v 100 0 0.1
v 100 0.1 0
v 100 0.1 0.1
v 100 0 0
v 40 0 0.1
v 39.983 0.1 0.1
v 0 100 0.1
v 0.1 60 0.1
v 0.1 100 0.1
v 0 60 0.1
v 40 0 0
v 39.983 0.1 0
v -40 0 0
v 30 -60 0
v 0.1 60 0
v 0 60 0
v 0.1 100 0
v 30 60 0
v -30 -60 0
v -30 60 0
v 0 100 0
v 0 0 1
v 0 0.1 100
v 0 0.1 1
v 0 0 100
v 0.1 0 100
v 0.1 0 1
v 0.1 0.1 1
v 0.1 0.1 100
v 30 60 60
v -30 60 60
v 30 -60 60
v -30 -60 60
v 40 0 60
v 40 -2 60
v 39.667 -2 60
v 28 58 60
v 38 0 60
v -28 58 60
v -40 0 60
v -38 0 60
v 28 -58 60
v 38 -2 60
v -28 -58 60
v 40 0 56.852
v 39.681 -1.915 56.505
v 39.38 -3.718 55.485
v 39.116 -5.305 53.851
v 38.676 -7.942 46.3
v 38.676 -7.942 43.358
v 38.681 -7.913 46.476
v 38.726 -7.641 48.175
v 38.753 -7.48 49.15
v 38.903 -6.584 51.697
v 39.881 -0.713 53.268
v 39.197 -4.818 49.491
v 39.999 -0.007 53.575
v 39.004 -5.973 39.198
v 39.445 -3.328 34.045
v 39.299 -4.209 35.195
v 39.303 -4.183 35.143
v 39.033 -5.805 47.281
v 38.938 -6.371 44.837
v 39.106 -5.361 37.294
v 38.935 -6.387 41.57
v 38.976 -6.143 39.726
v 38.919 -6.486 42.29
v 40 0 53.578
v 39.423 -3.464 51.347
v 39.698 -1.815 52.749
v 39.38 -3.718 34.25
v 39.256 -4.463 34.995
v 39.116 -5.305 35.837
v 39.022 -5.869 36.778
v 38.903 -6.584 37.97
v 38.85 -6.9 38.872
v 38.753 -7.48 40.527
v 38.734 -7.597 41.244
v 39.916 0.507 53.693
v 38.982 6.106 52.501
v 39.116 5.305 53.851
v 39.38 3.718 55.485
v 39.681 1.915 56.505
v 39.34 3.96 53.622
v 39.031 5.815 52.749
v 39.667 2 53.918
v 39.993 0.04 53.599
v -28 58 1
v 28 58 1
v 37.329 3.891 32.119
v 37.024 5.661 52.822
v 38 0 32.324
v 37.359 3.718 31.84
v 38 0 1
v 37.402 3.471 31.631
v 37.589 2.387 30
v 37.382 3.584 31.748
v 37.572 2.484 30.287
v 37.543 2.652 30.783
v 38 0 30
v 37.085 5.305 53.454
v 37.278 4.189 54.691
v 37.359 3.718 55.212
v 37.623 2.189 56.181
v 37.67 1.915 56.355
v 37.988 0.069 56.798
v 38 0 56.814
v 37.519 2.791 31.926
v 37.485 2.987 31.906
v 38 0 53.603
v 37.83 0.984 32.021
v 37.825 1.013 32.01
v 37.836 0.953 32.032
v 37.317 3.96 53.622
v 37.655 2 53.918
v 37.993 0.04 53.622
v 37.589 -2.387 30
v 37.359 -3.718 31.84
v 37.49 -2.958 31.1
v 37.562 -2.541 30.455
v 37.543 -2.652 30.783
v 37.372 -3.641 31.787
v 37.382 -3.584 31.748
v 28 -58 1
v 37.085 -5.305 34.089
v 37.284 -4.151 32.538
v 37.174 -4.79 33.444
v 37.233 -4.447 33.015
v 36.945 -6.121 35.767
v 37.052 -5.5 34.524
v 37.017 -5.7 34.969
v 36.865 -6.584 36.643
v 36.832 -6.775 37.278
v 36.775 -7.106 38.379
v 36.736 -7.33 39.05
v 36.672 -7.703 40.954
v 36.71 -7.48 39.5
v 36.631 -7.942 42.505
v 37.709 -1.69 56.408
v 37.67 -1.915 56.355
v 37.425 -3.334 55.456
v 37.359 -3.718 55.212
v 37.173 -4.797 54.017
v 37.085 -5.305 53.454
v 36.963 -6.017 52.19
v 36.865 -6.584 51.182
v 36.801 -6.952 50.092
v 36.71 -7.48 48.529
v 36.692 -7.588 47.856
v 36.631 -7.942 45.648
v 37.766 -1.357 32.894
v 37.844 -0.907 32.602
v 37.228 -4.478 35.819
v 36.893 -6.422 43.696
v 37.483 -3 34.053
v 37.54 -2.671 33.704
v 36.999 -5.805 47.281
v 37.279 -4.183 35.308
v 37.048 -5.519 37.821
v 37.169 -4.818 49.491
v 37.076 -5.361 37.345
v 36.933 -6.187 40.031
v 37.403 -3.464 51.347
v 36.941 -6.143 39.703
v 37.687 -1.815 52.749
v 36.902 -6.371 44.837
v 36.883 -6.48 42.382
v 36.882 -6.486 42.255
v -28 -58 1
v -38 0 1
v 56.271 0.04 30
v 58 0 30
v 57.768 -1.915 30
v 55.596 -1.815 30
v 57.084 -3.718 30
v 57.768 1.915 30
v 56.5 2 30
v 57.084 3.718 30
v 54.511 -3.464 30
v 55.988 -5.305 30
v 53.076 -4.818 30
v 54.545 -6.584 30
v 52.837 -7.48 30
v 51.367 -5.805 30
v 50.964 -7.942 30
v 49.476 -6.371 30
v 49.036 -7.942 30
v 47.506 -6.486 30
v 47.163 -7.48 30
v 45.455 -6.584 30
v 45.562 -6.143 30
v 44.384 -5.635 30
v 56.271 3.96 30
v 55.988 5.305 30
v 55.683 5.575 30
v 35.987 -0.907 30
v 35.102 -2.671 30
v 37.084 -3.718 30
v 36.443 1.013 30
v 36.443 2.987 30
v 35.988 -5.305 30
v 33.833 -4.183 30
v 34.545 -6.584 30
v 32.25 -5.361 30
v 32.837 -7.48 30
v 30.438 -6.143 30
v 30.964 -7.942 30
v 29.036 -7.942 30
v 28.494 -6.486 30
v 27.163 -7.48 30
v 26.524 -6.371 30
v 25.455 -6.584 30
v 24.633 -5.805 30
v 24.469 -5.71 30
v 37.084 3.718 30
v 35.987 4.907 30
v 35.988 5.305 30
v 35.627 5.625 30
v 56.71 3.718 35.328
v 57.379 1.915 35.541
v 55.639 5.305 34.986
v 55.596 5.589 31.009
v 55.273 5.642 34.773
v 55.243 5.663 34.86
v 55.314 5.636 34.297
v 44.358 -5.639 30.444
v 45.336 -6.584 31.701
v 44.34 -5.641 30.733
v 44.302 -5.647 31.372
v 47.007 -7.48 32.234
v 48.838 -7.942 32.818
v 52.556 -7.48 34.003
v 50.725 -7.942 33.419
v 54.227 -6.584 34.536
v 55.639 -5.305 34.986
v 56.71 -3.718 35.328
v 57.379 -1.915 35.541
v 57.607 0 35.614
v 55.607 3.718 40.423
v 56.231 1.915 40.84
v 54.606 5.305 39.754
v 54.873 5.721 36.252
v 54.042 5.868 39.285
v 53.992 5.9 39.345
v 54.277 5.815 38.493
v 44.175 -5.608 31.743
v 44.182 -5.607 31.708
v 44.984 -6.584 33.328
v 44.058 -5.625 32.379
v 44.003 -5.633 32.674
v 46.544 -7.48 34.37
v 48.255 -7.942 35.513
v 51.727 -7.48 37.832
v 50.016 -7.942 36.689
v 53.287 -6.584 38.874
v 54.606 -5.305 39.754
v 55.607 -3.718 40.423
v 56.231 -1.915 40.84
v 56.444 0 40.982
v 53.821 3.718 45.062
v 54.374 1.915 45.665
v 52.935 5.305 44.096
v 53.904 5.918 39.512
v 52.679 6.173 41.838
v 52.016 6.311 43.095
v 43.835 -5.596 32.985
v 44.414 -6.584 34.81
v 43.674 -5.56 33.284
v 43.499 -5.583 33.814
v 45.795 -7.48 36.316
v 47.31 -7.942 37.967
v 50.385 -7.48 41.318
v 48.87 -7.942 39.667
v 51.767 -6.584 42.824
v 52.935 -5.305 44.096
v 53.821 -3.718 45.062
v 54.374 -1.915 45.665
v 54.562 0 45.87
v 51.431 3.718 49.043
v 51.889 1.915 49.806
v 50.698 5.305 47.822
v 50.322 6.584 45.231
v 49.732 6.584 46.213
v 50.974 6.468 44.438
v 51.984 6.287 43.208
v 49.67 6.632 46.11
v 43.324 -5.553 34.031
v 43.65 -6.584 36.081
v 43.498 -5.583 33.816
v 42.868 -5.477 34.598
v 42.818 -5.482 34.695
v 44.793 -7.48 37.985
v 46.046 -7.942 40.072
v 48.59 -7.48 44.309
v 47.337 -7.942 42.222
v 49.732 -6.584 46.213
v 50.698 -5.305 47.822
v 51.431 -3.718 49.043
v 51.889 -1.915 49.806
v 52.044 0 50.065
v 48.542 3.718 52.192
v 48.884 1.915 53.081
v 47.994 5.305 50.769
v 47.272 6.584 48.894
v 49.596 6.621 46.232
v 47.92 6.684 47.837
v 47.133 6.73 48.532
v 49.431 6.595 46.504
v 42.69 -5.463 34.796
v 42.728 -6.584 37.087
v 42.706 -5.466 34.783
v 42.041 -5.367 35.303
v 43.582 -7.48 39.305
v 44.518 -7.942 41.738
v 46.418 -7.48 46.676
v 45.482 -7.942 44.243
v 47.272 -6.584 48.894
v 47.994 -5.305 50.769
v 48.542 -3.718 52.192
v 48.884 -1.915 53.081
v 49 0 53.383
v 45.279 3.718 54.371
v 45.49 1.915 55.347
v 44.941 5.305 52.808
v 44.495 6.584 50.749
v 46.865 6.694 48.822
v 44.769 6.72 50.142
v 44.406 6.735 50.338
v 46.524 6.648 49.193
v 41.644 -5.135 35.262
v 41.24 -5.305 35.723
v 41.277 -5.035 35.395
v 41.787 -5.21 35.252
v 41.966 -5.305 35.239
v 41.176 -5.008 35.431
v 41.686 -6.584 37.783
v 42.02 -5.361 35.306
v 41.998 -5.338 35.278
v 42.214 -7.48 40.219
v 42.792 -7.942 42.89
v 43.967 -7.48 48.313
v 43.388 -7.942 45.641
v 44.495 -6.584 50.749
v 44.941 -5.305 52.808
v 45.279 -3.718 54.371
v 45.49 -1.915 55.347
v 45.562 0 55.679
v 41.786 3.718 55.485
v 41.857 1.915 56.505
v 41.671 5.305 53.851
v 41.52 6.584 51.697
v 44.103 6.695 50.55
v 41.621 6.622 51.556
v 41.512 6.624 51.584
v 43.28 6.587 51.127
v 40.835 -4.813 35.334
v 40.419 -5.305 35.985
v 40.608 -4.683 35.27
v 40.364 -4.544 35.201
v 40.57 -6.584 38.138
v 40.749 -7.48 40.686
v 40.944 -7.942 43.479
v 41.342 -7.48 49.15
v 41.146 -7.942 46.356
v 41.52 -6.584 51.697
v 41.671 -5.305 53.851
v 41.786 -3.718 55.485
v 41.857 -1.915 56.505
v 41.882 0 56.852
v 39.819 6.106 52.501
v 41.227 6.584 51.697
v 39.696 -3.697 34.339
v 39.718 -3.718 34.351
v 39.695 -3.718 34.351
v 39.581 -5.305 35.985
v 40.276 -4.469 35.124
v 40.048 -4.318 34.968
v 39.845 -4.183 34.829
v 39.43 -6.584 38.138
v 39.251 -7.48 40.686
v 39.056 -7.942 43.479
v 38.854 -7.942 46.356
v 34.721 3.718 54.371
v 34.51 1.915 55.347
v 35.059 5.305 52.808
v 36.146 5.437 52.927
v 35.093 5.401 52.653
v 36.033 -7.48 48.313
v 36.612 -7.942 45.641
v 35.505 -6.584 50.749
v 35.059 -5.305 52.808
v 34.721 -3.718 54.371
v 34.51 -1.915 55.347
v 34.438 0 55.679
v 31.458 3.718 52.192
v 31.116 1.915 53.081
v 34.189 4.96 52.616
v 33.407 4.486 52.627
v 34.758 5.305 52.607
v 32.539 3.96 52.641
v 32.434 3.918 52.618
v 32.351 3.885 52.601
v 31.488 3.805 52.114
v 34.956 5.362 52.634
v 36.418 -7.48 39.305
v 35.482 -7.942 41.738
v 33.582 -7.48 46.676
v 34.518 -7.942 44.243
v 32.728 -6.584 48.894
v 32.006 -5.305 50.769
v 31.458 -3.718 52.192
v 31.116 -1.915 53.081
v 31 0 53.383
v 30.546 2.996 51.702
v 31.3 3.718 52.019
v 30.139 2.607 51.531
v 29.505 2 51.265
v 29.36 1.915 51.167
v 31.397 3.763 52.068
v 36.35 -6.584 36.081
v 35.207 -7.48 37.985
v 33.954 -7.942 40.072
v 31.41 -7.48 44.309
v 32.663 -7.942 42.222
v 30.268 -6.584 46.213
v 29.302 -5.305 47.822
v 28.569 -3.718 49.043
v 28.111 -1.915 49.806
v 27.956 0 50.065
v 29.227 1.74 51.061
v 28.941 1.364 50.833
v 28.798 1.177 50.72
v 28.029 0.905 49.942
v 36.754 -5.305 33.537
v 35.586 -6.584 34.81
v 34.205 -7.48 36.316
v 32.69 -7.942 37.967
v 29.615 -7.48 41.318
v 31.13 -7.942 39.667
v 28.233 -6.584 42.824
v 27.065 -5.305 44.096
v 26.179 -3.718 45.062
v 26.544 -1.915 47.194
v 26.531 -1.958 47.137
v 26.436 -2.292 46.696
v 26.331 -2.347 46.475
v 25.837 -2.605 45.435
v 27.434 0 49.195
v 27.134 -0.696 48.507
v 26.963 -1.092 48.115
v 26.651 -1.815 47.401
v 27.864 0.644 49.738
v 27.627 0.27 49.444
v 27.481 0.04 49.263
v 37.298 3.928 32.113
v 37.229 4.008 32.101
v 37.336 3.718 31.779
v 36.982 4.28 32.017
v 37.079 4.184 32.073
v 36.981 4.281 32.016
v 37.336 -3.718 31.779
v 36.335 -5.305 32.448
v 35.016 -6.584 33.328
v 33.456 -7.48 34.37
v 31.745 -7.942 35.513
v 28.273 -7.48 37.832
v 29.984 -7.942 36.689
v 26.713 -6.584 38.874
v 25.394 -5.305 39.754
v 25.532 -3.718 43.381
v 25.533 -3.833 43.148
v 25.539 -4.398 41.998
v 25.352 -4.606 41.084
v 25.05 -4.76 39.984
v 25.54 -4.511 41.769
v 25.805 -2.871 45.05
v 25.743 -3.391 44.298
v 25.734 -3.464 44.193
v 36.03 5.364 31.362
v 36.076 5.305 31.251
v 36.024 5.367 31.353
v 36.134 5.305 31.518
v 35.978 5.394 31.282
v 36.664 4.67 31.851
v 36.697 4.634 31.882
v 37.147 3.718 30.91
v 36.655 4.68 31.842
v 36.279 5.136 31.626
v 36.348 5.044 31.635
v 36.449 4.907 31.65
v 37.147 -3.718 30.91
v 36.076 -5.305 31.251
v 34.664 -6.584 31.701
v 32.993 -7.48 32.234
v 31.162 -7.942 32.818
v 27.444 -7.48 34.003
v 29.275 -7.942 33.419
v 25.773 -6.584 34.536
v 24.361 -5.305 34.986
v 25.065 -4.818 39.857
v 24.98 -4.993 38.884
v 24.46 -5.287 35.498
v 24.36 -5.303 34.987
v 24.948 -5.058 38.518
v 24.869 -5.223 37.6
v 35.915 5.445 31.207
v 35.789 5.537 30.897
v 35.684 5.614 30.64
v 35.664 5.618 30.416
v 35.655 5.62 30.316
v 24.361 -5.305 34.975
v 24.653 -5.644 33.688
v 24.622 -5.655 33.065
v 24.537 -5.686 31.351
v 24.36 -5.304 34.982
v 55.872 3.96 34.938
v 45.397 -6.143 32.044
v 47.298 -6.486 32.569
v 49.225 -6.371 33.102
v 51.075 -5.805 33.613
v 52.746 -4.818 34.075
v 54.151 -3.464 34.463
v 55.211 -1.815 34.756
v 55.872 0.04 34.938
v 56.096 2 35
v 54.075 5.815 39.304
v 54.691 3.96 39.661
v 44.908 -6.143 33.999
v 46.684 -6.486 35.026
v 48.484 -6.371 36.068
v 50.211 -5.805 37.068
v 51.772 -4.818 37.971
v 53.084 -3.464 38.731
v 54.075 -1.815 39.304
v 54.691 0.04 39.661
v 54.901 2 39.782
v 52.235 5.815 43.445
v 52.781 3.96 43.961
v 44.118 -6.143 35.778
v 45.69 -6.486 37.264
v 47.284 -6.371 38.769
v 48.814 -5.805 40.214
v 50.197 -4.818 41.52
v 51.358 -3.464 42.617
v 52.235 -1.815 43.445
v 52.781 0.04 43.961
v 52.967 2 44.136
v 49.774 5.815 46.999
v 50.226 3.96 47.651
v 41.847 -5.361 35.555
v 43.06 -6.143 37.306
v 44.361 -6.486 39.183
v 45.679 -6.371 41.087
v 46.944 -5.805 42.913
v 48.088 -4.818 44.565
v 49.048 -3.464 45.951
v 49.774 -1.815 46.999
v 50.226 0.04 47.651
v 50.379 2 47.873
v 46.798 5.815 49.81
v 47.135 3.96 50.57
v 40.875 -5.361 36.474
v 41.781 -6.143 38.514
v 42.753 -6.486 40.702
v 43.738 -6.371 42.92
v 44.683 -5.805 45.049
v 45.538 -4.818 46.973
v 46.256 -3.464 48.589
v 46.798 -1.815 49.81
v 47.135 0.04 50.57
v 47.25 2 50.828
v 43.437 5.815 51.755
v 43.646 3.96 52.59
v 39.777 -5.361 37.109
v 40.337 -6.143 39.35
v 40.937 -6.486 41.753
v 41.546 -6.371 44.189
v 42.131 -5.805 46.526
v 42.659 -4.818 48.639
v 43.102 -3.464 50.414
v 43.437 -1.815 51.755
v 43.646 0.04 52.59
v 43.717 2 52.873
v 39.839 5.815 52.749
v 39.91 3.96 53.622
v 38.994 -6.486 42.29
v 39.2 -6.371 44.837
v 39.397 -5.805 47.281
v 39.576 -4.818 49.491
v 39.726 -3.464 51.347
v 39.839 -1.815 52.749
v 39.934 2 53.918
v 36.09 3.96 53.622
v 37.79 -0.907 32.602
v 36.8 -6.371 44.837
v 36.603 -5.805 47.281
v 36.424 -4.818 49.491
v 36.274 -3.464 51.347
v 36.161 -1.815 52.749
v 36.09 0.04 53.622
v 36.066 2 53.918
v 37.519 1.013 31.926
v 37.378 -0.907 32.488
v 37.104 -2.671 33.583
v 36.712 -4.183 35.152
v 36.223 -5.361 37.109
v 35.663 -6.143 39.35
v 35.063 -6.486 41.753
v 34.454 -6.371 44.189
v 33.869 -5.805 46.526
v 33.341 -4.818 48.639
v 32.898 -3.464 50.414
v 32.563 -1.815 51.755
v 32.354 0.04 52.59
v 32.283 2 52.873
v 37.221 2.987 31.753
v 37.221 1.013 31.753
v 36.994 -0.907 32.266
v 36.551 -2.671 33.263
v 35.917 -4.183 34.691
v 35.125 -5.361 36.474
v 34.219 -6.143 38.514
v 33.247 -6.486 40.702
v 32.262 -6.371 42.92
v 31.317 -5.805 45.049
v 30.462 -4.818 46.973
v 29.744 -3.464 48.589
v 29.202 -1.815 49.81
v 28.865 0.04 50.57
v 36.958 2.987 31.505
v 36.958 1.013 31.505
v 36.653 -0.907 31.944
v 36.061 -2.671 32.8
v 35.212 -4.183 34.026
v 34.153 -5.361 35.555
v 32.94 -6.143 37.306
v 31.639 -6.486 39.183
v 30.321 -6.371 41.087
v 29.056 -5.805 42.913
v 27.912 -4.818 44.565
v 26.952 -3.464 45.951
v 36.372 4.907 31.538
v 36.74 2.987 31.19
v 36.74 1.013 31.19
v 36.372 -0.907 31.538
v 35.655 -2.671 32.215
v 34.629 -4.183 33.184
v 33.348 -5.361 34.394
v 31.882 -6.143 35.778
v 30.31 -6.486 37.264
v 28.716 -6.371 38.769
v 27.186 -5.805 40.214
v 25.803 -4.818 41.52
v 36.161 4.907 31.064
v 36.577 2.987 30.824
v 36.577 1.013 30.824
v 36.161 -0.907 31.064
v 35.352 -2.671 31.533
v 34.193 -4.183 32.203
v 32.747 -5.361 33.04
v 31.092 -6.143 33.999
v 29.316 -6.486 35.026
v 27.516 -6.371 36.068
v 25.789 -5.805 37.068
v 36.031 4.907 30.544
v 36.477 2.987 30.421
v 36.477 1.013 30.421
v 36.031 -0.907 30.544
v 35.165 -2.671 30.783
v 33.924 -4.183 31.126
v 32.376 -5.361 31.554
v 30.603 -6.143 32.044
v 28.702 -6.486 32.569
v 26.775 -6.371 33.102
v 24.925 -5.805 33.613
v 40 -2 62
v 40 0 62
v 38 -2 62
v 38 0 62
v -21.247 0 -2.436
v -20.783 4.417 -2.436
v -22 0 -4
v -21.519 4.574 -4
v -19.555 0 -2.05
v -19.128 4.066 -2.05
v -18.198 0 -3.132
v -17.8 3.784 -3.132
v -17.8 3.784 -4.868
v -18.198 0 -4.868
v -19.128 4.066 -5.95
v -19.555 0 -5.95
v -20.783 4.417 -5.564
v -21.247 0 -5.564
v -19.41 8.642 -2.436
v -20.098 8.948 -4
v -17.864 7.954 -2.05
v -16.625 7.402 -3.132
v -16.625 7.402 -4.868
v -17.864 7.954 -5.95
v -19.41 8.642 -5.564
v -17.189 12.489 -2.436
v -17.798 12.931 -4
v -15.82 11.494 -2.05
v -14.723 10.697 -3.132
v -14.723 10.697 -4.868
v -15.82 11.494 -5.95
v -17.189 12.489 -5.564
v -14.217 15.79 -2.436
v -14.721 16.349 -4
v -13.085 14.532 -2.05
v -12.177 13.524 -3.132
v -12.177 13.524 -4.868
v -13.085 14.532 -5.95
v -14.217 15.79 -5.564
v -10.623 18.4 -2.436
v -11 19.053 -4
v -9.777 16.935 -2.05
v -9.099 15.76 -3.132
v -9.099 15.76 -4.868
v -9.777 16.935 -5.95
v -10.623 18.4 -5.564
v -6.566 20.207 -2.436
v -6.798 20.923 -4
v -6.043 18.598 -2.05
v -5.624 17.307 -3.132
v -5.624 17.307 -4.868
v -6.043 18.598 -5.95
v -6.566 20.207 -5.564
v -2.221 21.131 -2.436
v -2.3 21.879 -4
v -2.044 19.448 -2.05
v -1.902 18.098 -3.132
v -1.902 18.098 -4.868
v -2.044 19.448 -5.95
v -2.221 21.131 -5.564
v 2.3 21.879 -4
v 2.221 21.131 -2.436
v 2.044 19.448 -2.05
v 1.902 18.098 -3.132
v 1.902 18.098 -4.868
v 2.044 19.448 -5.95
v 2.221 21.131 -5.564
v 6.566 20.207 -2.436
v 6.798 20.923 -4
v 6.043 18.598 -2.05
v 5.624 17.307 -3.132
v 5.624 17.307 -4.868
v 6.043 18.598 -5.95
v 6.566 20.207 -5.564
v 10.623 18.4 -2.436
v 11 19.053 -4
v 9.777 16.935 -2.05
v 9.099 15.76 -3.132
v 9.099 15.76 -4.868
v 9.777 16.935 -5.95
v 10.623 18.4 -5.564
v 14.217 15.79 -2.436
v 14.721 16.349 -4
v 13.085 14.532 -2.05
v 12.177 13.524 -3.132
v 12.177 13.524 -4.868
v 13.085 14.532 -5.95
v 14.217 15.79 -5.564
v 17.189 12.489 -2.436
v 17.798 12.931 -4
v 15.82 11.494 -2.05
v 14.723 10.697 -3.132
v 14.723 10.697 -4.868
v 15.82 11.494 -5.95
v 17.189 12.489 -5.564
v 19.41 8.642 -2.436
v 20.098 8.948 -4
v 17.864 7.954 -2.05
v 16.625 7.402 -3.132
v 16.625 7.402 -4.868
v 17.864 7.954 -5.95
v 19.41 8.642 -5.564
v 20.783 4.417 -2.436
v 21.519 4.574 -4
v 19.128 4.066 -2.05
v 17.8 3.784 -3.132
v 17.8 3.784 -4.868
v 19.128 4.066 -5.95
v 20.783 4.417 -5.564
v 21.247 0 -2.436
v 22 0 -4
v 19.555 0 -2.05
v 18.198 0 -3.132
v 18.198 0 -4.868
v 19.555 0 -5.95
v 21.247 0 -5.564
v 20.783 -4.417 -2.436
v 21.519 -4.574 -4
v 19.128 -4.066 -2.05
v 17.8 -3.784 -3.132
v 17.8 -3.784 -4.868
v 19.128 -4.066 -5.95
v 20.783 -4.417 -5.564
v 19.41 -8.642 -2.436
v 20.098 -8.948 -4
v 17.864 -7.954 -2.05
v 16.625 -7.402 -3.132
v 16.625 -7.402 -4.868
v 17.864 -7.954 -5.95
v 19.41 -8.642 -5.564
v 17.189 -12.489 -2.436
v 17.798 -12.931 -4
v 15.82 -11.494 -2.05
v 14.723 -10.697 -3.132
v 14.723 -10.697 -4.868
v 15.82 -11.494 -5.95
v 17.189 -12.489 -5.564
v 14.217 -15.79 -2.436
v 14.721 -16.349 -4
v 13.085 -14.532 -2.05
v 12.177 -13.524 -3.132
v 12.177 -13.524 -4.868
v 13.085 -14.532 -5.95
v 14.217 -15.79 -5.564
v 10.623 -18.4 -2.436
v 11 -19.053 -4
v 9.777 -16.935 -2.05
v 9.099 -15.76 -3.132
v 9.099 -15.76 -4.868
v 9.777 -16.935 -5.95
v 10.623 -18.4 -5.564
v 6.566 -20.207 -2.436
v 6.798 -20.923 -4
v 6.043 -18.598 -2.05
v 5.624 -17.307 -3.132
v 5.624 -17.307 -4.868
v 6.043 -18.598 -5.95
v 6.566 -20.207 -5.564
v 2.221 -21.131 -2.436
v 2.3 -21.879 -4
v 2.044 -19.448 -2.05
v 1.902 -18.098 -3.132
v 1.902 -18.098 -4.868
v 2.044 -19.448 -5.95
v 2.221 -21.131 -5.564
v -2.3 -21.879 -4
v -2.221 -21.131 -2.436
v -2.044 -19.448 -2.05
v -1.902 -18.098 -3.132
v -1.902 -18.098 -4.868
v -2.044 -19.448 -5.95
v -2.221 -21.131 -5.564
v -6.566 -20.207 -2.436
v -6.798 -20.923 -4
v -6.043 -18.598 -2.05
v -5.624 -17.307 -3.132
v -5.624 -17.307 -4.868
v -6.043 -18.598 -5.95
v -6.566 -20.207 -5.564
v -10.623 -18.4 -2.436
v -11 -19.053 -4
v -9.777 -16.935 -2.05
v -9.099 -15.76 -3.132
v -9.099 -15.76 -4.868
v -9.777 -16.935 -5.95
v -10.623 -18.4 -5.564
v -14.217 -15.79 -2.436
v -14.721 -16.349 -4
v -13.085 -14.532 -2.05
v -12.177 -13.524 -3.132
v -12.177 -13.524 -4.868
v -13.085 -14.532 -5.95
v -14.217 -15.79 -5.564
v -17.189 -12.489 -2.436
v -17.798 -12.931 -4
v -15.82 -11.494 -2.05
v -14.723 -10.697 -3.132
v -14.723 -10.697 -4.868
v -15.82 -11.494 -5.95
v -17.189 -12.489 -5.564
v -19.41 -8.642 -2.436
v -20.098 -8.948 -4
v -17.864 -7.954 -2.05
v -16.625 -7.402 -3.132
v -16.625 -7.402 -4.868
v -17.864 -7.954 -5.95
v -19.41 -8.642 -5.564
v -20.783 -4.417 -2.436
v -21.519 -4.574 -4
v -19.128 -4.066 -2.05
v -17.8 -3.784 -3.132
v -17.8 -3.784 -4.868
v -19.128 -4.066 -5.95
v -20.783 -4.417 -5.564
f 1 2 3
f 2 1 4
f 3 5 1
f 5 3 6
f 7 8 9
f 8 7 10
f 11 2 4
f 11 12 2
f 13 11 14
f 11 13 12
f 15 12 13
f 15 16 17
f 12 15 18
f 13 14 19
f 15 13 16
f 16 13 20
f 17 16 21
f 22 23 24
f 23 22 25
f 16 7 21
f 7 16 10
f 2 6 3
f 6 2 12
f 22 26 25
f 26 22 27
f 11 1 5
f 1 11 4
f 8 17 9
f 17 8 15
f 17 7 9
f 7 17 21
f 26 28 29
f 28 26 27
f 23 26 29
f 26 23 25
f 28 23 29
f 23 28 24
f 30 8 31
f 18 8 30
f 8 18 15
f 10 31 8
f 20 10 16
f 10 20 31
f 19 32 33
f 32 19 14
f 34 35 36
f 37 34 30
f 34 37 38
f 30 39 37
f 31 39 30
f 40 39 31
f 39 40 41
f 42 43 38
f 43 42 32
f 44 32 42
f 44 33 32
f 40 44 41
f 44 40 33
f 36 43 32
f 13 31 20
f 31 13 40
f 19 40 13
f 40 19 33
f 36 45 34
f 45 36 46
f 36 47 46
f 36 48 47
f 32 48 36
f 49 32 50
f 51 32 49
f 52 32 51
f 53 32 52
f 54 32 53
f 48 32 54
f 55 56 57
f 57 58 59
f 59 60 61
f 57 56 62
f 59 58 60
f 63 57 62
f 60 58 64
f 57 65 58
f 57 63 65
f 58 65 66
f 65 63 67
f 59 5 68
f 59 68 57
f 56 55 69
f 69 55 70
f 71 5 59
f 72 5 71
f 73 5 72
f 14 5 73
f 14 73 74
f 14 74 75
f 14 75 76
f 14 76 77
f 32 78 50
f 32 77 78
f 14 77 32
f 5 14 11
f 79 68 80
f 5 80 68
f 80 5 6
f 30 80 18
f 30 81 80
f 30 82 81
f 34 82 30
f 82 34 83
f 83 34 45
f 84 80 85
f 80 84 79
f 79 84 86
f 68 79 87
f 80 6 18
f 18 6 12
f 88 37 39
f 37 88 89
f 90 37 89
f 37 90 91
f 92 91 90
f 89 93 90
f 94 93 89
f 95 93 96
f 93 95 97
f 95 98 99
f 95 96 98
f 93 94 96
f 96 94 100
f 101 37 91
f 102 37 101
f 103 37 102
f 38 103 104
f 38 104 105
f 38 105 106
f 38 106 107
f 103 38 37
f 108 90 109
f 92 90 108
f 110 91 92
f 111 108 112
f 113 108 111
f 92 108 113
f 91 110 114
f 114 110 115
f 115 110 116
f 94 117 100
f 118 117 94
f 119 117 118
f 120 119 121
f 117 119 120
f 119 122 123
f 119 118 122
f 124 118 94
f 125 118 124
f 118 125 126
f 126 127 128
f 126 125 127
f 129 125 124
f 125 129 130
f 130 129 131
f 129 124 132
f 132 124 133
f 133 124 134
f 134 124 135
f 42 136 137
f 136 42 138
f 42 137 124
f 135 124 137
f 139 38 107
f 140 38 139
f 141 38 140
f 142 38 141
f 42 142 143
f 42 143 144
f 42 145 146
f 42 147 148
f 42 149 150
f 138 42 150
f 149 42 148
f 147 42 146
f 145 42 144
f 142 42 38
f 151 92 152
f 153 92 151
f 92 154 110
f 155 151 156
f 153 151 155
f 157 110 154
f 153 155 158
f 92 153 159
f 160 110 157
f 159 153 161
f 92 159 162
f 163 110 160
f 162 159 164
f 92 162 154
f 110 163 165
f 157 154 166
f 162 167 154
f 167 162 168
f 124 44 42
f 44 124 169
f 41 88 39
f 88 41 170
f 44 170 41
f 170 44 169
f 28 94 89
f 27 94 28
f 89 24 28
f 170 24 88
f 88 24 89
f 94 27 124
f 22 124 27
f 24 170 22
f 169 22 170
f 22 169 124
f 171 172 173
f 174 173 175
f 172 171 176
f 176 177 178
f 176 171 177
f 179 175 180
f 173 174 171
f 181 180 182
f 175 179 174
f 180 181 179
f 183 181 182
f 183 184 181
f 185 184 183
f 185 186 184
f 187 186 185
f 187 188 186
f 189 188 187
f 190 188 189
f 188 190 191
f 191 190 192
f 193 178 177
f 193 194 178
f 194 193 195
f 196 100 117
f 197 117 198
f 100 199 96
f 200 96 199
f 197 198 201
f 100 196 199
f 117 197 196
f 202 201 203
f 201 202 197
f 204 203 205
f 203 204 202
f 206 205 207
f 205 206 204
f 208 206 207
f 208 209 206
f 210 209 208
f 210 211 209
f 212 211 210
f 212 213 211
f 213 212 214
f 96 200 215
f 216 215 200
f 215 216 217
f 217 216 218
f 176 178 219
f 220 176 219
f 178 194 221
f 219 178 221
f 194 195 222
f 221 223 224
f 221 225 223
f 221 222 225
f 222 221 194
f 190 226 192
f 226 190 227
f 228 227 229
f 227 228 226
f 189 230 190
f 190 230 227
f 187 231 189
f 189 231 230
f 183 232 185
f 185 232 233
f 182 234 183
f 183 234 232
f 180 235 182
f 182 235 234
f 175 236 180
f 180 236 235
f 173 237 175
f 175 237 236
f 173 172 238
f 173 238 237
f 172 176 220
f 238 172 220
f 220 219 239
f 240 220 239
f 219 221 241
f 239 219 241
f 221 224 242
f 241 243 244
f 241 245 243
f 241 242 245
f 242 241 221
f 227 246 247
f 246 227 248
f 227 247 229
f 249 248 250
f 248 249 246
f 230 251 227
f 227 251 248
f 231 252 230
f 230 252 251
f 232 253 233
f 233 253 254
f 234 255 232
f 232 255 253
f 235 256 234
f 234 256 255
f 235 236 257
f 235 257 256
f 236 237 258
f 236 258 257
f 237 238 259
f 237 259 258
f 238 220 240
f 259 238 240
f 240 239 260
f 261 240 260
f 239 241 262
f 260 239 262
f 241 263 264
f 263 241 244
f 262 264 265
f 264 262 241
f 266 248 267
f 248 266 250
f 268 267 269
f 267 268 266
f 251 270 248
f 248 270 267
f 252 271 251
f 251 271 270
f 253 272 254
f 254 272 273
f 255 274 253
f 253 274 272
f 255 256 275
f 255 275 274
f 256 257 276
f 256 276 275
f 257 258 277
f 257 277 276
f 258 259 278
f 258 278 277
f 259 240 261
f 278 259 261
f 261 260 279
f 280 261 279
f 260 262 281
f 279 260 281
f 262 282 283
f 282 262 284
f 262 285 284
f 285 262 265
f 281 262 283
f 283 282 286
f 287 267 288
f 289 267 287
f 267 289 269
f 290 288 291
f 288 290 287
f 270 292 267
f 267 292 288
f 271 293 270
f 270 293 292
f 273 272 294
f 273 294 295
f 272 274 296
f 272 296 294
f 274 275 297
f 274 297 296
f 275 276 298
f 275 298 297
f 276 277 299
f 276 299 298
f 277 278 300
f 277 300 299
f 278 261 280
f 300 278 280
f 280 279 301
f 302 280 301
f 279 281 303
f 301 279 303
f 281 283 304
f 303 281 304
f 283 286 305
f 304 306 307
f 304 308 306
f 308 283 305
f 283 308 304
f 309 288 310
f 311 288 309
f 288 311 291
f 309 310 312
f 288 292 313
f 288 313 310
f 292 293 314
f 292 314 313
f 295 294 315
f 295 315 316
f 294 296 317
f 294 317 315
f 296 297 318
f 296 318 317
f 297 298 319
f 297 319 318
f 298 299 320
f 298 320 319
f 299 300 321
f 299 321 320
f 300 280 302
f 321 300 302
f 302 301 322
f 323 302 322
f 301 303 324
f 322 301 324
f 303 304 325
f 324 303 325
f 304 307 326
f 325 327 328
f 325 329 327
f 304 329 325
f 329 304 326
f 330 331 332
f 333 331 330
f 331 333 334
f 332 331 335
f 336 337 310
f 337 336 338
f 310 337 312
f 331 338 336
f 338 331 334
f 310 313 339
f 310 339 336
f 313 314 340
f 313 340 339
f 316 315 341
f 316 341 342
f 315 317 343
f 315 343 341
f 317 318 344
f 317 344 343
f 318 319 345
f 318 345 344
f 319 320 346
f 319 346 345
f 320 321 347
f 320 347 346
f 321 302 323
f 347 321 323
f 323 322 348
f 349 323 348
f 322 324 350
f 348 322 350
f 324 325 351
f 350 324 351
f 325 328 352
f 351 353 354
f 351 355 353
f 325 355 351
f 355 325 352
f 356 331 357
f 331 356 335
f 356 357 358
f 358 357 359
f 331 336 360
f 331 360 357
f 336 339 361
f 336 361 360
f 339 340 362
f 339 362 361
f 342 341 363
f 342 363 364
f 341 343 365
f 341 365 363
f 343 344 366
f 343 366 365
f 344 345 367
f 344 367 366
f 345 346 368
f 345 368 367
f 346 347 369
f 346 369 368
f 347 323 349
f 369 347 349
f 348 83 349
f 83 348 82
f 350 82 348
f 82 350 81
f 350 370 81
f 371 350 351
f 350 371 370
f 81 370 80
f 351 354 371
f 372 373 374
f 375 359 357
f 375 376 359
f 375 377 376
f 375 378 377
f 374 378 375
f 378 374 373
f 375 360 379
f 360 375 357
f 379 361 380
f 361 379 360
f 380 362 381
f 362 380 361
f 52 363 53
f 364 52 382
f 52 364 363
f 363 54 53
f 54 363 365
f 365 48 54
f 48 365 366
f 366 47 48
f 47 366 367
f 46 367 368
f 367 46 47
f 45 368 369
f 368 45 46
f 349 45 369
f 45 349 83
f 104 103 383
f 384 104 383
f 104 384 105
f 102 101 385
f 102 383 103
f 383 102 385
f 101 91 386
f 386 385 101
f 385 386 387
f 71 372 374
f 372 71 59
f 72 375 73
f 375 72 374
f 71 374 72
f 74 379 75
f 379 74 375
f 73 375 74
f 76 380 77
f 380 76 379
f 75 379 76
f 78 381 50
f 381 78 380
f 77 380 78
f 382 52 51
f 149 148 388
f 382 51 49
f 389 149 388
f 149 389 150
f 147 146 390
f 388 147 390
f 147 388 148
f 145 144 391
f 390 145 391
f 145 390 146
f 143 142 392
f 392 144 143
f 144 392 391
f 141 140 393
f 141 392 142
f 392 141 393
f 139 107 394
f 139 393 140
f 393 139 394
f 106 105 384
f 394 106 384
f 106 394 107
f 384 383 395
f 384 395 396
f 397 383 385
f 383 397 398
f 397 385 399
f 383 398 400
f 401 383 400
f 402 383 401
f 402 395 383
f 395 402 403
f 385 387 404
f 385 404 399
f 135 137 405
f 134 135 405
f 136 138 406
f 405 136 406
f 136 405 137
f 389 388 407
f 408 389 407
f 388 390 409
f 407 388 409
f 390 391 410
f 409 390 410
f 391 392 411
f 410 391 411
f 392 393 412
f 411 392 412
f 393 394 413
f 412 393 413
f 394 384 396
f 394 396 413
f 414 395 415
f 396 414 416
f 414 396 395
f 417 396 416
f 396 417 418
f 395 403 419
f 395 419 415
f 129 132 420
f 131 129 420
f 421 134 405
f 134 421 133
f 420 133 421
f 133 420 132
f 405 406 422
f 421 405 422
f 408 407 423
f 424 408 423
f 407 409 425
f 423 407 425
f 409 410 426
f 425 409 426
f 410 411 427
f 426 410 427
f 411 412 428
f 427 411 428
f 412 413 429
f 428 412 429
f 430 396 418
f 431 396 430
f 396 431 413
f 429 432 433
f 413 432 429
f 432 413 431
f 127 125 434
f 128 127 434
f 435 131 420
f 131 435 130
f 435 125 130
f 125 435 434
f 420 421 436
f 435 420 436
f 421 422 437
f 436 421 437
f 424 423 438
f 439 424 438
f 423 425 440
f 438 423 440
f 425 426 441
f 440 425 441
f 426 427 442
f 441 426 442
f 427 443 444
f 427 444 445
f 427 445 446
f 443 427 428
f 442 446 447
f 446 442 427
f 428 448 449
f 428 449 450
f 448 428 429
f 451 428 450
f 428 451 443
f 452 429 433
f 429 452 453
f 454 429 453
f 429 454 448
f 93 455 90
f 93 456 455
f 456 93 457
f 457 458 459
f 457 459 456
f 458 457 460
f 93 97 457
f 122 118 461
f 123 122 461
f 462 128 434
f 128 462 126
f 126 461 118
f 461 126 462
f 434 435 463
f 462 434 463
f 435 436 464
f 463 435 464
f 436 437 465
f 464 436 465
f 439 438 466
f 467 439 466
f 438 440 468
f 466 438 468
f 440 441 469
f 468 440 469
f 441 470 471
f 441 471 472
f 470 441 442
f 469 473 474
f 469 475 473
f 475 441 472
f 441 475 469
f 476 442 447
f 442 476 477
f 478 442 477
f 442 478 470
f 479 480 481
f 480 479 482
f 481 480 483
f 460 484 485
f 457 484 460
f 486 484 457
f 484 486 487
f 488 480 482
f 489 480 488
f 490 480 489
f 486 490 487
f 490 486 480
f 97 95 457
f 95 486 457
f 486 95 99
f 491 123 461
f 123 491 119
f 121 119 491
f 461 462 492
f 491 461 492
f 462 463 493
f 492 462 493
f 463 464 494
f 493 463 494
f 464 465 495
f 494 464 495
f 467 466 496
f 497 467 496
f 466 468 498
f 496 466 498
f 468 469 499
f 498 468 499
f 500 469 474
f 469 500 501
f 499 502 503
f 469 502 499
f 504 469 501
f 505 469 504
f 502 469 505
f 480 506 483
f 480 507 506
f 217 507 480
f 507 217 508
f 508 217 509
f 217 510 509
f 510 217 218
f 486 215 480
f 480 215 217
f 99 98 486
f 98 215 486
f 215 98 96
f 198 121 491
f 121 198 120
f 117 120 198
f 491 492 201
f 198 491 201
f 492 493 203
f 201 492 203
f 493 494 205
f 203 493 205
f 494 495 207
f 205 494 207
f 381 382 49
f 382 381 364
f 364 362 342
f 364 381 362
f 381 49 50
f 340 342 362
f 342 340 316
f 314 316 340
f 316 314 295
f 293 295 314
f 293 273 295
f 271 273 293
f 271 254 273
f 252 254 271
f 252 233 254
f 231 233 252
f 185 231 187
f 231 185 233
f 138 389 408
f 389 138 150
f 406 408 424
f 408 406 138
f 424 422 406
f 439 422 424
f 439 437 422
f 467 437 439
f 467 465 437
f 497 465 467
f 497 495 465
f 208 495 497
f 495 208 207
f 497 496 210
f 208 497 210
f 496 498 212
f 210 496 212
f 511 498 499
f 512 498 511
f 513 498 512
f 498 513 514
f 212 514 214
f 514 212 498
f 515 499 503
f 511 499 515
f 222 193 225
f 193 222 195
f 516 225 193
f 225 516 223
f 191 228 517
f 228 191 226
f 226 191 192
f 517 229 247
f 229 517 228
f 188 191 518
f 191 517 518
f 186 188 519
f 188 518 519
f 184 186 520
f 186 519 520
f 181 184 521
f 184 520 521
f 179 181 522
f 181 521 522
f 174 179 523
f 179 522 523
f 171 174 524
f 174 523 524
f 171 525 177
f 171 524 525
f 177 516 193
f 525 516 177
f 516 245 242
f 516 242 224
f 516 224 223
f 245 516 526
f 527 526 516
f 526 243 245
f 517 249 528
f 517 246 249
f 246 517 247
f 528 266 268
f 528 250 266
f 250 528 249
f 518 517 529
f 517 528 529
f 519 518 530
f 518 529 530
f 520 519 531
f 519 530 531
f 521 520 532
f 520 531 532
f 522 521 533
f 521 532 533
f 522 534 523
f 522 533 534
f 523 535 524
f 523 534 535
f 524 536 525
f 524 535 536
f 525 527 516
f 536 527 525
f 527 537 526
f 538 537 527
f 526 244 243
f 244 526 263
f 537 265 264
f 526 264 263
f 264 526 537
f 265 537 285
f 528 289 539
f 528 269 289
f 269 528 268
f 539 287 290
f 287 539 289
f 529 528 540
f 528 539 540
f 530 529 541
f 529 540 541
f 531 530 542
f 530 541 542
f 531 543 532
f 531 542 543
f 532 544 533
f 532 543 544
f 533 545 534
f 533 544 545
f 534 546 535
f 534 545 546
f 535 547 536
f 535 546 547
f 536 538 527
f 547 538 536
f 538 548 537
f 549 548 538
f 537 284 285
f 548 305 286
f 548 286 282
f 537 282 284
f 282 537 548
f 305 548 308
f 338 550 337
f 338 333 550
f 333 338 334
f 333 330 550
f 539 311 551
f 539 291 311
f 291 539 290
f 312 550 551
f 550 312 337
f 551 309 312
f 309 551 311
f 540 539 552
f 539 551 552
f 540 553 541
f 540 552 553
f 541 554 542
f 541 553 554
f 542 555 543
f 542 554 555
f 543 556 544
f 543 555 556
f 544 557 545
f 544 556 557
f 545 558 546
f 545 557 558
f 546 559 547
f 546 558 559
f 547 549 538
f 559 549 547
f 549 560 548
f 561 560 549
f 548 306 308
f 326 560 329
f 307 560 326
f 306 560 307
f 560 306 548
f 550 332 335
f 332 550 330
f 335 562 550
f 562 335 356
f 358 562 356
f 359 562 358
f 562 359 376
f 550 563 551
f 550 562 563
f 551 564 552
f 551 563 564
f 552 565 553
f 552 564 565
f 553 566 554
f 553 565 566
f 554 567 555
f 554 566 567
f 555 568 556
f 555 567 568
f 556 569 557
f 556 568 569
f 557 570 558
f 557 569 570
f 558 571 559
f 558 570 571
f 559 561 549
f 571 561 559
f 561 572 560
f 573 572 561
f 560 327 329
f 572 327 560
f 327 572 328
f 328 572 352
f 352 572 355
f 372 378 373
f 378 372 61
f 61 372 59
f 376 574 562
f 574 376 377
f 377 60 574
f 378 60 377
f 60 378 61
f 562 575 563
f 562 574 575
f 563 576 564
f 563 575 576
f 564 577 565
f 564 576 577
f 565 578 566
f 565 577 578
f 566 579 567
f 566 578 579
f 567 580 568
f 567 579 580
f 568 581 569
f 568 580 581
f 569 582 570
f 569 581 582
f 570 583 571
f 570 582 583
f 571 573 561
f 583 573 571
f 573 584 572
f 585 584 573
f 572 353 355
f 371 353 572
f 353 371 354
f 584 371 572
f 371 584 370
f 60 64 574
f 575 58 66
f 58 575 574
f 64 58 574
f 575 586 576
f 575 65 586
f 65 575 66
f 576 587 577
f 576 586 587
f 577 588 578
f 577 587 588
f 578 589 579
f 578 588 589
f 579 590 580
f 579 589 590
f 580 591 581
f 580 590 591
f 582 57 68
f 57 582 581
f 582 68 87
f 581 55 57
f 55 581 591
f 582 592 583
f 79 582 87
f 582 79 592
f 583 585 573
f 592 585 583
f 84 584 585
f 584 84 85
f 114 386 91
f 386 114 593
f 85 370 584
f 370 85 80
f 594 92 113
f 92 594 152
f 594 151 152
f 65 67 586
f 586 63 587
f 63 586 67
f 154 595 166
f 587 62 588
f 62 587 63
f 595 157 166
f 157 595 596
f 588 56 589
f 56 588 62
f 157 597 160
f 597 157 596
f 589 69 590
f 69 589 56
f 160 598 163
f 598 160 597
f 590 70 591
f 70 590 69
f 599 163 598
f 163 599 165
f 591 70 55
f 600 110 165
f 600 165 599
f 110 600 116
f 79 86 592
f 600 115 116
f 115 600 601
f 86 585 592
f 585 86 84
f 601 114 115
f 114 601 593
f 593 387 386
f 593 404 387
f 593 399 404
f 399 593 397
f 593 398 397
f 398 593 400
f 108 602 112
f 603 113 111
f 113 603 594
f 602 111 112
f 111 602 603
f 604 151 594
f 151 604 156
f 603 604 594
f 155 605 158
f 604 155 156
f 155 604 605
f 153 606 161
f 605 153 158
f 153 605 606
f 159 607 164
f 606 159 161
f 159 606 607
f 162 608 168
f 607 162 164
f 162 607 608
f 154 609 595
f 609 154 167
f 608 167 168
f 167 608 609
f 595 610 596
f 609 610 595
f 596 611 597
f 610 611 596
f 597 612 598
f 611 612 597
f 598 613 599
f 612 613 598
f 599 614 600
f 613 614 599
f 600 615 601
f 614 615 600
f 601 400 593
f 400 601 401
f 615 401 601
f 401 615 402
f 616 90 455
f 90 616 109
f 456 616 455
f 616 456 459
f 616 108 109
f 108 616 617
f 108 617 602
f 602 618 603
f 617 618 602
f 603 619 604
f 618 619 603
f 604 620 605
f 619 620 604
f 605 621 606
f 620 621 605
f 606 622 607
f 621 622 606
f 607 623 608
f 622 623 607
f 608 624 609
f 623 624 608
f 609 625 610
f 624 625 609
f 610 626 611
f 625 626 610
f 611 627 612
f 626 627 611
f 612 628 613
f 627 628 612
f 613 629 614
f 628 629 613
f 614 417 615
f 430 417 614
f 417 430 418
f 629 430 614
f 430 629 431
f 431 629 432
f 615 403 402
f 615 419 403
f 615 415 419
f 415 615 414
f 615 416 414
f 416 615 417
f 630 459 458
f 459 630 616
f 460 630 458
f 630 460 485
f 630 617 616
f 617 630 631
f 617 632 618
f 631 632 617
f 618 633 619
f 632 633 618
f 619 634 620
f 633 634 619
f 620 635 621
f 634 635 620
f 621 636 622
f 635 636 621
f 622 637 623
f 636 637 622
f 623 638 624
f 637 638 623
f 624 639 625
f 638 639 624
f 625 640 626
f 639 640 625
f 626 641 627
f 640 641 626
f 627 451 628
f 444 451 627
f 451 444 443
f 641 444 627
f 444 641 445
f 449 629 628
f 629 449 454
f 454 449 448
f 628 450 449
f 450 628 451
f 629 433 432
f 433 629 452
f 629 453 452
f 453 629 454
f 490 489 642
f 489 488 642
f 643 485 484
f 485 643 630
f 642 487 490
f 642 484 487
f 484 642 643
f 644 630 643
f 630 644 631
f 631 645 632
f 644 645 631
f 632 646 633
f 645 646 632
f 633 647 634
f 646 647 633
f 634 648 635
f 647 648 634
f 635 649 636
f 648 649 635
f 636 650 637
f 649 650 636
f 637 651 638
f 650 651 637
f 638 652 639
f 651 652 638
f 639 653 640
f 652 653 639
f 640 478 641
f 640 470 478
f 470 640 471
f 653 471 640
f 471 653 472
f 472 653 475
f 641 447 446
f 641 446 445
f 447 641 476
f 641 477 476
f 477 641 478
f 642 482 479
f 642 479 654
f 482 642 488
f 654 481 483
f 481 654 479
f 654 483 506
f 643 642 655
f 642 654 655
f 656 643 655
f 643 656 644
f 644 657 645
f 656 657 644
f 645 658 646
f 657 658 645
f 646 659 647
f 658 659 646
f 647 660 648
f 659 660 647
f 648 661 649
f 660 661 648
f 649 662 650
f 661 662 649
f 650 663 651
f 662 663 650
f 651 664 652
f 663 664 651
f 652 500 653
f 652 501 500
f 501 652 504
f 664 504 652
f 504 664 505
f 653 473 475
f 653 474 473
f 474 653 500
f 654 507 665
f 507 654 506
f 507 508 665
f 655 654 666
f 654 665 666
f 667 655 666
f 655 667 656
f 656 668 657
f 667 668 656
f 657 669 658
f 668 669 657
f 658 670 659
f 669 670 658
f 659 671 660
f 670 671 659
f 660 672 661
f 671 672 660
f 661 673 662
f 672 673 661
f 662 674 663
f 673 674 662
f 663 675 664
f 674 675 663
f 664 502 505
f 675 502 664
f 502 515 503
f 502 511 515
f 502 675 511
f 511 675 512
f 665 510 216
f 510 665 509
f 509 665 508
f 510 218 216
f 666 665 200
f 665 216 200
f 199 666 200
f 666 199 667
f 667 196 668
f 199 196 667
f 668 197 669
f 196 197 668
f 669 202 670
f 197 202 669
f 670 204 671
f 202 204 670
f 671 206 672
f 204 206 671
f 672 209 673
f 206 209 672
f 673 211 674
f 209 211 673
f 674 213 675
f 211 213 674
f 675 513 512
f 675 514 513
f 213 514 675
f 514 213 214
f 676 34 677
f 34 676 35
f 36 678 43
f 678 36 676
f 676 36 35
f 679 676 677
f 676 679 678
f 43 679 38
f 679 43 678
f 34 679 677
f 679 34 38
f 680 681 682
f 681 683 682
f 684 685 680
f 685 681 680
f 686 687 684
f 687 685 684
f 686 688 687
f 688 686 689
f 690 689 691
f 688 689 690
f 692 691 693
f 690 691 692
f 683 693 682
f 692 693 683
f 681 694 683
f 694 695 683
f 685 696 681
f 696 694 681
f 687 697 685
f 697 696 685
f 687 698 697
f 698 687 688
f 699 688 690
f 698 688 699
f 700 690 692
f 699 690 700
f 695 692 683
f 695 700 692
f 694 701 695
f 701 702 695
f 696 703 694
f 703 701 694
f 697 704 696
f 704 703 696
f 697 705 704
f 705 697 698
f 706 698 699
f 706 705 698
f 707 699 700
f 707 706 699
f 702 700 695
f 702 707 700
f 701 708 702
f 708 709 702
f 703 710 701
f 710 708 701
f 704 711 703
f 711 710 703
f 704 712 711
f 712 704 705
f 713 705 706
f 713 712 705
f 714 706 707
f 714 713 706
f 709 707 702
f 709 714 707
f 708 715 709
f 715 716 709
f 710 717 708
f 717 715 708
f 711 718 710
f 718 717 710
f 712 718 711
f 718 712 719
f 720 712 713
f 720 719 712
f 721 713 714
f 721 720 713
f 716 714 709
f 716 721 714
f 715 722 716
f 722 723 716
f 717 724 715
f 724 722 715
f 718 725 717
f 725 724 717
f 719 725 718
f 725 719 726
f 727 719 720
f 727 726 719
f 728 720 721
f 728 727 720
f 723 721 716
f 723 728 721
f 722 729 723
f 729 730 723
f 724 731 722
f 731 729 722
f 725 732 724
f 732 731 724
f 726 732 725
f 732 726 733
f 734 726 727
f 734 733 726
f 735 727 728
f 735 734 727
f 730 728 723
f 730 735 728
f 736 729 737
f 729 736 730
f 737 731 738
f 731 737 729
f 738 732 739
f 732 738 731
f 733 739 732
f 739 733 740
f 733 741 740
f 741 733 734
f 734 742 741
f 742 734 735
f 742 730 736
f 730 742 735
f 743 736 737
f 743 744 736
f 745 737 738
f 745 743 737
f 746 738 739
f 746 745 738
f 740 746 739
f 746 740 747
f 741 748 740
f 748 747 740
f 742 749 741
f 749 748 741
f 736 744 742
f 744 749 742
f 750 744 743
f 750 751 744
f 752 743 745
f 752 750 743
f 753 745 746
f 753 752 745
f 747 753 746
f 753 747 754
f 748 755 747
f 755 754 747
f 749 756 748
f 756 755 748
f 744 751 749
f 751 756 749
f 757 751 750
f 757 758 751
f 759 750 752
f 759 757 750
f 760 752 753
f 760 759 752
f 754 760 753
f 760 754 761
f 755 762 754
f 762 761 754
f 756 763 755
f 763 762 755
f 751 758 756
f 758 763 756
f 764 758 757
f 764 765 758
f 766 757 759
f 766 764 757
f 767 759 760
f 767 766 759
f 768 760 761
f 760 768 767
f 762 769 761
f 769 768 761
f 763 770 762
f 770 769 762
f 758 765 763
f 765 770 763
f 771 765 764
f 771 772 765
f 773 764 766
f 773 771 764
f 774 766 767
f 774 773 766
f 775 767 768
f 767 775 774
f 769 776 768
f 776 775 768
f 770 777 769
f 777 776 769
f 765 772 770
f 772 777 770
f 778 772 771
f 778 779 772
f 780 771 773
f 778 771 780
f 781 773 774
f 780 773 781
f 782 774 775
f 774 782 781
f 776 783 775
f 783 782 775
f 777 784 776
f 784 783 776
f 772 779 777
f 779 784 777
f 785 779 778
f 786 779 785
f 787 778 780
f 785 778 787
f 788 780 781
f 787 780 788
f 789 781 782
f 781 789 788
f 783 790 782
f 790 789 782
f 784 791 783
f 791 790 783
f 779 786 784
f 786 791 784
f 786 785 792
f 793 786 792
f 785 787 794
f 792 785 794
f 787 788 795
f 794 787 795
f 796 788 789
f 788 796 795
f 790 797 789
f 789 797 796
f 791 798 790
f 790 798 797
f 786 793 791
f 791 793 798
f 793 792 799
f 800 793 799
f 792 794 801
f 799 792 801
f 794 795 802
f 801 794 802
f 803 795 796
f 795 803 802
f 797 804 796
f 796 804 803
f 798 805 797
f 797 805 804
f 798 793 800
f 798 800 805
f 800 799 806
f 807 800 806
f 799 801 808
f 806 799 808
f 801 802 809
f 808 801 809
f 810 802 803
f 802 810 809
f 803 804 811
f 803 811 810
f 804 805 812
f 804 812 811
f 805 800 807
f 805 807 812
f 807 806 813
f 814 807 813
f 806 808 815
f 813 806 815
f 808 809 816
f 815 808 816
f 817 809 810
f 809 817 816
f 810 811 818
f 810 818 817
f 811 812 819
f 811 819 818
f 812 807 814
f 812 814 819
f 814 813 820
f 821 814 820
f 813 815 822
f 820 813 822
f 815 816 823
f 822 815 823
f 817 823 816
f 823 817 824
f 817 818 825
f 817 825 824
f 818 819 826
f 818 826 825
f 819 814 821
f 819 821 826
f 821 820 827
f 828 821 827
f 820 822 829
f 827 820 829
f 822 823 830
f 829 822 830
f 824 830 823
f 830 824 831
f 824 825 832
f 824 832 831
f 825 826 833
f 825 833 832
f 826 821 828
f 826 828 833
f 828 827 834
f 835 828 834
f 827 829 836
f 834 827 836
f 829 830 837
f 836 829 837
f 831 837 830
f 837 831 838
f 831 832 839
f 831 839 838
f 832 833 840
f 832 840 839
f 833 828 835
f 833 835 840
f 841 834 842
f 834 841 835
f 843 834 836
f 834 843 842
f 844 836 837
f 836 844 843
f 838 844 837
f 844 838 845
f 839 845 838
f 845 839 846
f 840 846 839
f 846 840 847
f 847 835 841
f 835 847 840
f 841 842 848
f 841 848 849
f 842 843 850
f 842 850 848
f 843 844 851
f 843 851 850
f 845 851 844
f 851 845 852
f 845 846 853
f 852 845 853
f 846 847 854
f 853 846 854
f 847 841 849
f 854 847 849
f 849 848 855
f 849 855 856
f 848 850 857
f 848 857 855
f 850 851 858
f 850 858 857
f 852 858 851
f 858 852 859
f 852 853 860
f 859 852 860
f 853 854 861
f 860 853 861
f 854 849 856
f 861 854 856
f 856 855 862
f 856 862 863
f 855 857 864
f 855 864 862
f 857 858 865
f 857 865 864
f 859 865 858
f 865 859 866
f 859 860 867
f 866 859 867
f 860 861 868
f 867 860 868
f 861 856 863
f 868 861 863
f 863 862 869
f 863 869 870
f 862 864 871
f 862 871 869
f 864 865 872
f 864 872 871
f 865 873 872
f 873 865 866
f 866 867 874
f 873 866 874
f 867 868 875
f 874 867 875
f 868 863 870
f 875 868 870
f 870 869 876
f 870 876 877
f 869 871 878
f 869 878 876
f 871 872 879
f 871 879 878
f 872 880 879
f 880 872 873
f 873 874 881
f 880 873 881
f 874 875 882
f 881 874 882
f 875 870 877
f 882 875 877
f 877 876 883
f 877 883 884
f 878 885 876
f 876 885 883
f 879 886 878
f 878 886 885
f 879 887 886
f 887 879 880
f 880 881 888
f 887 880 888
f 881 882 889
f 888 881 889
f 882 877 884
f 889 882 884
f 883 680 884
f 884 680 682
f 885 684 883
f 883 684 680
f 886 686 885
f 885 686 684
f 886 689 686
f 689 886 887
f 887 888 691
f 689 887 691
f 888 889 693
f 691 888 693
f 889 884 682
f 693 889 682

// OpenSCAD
    // Combined Scene

    // Permanent Model
    
    // Permanent Model (Black)
    color([0, 0, 0]) {
        // Your permanent model code here
        cube([100,0.1,0.1], center = false);
        cube([0.1,100,0.1], center = false);
        cube([0.1,0.1,100], center = false);
    }
    

    // Dynamic Model
    translate([0, 0, 0]) {
    // Main body of the mug with a slight taper
    difference() {
        // Create the outer body with a taper towards the base
        linear_extrude(height = 60) 
            polygon(points=[[40,0], [30,60], [-30,60], [-40,0], [-30,-60], [30,-60]]);
        // Hollow out the inside of the mug
        translate([0, 0, 1])
            linear_extrude(height = 62) 
                polygon(points=[[38,0], [28,58], [-28,58], [-38,0], [-28,-58], [28,-58]]);
    }

    // Adding a distinct rim to the mug
    translate([0, 0, 60]) {
        linear_extrude(height = 2) 
            polygon(points=[[40,0], [38,0], [38,-2], [40,-2]]);
    }

    // Handle of the mug
    translate([40, 0, 30]) {
        rotate([90, 0, 0])
        difference() {
            // Create a handle with a rounded shape
            scale([1, 1.5, 1])
            rotate_extrude(angle = 180)
            translate([10, 0])
                circle(r = 8);
                
            // Subtract inner handle to hollow it out
            translate([-2, 0, -2])
                scale([1, 1.3, 1])
                rotate_extrude(angle = 180)
                translate([10, 0])
                    circle(r = 8.5);
        }
    }

    // Rounded base for stability
    translate([0, 0, -4]) {
        rotate_extrude(angle = 360)
            translate([20, 0])
                circle(r = 2);
    }
}
    
